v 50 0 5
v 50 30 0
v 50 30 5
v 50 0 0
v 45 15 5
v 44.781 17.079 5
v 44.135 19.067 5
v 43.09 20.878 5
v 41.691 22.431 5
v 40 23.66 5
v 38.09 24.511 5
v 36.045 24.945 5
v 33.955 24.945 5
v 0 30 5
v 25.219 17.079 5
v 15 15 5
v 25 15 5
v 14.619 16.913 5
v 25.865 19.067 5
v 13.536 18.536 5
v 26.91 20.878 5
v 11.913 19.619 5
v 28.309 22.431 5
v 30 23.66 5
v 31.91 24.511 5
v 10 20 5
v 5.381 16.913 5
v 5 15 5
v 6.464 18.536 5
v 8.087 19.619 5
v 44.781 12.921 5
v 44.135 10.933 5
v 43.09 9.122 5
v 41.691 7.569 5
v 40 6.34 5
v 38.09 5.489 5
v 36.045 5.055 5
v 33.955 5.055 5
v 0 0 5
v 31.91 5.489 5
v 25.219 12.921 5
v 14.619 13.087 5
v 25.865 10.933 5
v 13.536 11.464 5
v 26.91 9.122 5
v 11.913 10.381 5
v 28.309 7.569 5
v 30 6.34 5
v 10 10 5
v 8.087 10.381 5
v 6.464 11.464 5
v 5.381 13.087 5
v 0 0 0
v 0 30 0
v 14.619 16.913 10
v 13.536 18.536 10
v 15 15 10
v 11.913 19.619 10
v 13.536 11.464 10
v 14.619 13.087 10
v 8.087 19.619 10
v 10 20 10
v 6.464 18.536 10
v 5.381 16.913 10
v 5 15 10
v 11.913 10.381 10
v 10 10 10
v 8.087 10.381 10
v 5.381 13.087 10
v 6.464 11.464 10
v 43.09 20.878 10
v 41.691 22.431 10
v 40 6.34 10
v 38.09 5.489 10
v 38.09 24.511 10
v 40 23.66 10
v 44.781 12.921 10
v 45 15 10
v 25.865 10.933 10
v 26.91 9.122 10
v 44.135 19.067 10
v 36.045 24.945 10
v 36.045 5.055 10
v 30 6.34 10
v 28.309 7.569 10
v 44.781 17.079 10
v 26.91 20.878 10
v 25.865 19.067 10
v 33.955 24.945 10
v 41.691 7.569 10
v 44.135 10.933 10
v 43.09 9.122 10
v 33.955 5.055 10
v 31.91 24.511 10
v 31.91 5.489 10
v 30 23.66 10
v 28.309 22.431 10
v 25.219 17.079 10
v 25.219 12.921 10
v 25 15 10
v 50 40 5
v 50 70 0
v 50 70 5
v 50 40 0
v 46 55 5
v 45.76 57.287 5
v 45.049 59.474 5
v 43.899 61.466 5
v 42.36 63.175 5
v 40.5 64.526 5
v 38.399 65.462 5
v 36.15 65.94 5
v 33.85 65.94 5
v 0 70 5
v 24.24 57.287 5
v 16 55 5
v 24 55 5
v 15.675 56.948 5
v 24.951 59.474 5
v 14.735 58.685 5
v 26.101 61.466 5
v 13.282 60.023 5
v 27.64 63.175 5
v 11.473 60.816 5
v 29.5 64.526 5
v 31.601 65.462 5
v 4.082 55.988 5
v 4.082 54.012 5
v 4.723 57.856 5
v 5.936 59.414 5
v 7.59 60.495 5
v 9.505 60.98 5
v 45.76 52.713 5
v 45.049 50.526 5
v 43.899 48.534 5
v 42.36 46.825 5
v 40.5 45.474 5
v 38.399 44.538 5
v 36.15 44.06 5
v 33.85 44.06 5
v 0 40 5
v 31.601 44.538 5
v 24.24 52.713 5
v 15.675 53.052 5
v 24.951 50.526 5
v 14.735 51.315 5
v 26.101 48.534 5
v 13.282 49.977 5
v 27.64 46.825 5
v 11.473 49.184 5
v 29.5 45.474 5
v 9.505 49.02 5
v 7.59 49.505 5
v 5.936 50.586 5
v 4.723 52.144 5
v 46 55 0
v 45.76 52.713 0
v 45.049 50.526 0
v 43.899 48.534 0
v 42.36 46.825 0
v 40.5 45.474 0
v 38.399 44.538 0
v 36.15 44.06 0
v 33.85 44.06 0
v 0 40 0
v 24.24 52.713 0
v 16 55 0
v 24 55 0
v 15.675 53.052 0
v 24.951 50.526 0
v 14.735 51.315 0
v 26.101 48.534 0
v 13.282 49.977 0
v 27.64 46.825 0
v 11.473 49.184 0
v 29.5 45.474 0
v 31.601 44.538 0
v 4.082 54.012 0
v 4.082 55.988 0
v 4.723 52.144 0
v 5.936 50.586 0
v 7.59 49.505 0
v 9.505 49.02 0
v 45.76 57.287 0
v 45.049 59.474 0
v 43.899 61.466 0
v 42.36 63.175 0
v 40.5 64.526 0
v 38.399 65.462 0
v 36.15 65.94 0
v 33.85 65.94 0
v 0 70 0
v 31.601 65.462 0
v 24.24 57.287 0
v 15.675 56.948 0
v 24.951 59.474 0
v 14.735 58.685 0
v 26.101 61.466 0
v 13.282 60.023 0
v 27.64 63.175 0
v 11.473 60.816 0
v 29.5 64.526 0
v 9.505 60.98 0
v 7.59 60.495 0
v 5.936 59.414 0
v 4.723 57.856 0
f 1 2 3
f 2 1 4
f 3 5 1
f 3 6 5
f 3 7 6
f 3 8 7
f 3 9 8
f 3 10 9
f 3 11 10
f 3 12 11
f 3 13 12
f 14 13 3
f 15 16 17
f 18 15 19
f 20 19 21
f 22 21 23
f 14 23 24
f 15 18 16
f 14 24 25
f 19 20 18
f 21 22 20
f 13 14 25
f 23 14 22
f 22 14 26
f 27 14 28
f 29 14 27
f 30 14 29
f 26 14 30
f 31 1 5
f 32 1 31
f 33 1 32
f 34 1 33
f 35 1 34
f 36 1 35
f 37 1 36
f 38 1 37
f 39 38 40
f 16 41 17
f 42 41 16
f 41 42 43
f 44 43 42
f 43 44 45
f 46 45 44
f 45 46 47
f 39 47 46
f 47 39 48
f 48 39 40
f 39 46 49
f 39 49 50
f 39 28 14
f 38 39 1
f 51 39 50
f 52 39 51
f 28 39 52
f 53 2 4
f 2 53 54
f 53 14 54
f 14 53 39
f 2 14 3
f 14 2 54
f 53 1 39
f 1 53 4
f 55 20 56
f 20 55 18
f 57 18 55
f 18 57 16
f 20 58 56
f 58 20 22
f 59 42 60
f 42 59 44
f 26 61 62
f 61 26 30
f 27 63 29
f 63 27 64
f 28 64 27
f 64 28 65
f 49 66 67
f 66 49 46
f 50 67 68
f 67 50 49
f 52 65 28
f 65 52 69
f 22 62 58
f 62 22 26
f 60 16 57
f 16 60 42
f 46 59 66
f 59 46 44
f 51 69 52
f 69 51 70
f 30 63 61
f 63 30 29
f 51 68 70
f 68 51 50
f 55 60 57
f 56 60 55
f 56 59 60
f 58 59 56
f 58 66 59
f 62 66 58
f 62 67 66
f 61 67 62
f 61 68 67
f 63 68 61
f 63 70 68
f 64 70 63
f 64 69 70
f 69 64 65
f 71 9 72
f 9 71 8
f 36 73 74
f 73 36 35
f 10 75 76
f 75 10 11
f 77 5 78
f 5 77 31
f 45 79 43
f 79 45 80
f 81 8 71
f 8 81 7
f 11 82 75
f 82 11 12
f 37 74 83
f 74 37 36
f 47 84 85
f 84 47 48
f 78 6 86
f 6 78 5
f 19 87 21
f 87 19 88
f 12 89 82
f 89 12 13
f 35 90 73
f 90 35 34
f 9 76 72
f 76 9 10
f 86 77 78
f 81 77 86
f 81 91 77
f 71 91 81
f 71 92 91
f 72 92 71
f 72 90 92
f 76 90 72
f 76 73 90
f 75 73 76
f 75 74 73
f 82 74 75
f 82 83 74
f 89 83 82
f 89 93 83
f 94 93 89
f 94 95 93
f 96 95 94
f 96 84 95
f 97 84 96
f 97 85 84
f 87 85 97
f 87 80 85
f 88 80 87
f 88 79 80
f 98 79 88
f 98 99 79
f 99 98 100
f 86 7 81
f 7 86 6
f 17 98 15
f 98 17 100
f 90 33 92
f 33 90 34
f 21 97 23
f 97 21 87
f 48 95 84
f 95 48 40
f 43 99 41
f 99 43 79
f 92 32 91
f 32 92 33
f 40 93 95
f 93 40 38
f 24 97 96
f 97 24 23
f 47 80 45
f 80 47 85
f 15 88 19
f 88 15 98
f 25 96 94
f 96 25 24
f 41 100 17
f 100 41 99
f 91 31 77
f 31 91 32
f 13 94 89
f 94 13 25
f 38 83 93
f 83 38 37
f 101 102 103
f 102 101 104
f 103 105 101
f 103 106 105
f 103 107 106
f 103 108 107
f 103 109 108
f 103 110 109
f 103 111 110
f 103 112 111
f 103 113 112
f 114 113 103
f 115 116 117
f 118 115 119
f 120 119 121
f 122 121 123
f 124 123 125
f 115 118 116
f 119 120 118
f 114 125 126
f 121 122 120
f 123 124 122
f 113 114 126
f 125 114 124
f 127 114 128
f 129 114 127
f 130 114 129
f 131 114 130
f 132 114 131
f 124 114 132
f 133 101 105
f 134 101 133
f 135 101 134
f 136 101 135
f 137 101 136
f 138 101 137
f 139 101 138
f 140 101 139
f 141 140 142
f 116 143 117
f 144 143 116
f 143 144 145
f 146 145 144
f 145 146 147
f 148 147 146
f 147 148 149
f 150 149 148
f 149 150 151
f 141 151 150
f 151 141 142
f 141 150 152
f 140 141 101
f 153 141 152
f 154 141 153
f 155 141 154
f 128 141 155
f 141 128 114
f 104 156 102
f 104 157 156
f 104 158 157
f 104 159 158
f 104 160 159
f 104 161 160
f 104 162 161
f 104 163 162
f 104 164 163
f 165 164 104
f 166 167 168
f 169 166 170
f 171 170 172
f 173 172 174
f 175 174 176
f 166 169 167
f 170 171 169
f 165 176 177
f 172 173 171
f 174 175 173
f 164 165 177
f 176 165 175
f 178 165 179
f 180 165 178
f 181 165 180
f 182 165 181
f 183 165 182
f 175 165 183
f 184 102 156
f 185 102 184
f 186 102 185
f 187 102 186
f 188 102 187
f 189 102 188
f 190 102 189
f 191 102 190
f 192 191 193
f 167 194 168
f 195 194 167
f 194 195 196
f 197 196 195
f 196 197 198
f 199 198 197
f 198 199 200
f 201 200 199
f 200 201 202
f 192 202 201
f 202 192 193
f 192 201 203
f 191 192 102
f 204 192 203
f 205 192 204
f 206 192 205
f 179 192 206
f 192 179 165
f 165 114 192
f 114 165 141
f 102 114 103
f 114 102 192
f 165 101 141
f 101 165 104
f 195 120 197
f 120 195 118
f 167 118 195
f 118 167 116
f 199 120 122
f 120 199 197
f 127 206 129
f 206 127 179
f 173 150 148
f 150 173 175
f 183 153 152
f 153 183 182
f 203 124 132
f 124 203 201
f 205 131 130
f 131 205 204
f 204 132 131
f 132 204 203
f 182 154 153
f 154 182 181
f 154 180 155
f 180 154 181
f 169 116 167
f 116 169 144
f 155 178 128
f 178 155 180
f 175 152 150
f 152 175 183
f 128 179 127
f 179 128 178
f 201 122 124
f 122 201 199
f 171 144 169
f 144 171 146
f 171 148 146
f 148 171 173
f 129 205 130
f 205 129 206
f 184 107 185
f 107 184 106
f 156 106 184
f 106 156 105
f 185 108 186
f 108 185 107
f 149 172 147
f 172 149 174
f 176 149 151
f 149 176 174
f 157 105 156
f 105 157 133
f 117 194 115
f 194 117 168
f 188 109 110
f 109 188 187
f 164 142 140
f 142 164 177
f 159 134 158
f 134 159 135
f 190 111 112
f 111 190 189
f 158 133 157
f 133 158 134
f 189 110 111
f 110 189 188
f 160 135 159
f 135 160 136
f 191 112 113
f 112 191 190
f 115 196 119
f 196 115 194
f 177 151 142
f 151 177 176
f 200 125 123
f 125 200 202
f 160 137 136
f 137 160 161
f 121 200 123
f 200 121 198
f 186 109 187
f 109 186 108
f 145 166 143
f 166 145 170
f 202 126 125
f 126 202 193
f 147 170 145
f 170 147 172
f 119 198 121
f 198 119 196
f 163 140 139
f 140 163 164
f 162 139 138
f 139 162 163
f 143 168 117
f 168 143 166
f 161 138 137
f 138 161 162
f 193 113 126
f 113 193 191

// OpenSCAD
// 3D Shapes- Hole and Pin Test

// Pins
union() {
    cube([50, 30, 5]);
    translate([10, 15, 0]) cylinder(h=10, r=5);
    translate([35, 15, 0]) cylinder(h=10, r=10);
}

// Holes
translate([0, 40, 0]) difference() {
    cube([50, 30, 5]);
    translate([10, 15, -1]) cylinder(h=10, r=6);
    translate([35, 15, -1]) cylinder(h=10, r=11);
}
